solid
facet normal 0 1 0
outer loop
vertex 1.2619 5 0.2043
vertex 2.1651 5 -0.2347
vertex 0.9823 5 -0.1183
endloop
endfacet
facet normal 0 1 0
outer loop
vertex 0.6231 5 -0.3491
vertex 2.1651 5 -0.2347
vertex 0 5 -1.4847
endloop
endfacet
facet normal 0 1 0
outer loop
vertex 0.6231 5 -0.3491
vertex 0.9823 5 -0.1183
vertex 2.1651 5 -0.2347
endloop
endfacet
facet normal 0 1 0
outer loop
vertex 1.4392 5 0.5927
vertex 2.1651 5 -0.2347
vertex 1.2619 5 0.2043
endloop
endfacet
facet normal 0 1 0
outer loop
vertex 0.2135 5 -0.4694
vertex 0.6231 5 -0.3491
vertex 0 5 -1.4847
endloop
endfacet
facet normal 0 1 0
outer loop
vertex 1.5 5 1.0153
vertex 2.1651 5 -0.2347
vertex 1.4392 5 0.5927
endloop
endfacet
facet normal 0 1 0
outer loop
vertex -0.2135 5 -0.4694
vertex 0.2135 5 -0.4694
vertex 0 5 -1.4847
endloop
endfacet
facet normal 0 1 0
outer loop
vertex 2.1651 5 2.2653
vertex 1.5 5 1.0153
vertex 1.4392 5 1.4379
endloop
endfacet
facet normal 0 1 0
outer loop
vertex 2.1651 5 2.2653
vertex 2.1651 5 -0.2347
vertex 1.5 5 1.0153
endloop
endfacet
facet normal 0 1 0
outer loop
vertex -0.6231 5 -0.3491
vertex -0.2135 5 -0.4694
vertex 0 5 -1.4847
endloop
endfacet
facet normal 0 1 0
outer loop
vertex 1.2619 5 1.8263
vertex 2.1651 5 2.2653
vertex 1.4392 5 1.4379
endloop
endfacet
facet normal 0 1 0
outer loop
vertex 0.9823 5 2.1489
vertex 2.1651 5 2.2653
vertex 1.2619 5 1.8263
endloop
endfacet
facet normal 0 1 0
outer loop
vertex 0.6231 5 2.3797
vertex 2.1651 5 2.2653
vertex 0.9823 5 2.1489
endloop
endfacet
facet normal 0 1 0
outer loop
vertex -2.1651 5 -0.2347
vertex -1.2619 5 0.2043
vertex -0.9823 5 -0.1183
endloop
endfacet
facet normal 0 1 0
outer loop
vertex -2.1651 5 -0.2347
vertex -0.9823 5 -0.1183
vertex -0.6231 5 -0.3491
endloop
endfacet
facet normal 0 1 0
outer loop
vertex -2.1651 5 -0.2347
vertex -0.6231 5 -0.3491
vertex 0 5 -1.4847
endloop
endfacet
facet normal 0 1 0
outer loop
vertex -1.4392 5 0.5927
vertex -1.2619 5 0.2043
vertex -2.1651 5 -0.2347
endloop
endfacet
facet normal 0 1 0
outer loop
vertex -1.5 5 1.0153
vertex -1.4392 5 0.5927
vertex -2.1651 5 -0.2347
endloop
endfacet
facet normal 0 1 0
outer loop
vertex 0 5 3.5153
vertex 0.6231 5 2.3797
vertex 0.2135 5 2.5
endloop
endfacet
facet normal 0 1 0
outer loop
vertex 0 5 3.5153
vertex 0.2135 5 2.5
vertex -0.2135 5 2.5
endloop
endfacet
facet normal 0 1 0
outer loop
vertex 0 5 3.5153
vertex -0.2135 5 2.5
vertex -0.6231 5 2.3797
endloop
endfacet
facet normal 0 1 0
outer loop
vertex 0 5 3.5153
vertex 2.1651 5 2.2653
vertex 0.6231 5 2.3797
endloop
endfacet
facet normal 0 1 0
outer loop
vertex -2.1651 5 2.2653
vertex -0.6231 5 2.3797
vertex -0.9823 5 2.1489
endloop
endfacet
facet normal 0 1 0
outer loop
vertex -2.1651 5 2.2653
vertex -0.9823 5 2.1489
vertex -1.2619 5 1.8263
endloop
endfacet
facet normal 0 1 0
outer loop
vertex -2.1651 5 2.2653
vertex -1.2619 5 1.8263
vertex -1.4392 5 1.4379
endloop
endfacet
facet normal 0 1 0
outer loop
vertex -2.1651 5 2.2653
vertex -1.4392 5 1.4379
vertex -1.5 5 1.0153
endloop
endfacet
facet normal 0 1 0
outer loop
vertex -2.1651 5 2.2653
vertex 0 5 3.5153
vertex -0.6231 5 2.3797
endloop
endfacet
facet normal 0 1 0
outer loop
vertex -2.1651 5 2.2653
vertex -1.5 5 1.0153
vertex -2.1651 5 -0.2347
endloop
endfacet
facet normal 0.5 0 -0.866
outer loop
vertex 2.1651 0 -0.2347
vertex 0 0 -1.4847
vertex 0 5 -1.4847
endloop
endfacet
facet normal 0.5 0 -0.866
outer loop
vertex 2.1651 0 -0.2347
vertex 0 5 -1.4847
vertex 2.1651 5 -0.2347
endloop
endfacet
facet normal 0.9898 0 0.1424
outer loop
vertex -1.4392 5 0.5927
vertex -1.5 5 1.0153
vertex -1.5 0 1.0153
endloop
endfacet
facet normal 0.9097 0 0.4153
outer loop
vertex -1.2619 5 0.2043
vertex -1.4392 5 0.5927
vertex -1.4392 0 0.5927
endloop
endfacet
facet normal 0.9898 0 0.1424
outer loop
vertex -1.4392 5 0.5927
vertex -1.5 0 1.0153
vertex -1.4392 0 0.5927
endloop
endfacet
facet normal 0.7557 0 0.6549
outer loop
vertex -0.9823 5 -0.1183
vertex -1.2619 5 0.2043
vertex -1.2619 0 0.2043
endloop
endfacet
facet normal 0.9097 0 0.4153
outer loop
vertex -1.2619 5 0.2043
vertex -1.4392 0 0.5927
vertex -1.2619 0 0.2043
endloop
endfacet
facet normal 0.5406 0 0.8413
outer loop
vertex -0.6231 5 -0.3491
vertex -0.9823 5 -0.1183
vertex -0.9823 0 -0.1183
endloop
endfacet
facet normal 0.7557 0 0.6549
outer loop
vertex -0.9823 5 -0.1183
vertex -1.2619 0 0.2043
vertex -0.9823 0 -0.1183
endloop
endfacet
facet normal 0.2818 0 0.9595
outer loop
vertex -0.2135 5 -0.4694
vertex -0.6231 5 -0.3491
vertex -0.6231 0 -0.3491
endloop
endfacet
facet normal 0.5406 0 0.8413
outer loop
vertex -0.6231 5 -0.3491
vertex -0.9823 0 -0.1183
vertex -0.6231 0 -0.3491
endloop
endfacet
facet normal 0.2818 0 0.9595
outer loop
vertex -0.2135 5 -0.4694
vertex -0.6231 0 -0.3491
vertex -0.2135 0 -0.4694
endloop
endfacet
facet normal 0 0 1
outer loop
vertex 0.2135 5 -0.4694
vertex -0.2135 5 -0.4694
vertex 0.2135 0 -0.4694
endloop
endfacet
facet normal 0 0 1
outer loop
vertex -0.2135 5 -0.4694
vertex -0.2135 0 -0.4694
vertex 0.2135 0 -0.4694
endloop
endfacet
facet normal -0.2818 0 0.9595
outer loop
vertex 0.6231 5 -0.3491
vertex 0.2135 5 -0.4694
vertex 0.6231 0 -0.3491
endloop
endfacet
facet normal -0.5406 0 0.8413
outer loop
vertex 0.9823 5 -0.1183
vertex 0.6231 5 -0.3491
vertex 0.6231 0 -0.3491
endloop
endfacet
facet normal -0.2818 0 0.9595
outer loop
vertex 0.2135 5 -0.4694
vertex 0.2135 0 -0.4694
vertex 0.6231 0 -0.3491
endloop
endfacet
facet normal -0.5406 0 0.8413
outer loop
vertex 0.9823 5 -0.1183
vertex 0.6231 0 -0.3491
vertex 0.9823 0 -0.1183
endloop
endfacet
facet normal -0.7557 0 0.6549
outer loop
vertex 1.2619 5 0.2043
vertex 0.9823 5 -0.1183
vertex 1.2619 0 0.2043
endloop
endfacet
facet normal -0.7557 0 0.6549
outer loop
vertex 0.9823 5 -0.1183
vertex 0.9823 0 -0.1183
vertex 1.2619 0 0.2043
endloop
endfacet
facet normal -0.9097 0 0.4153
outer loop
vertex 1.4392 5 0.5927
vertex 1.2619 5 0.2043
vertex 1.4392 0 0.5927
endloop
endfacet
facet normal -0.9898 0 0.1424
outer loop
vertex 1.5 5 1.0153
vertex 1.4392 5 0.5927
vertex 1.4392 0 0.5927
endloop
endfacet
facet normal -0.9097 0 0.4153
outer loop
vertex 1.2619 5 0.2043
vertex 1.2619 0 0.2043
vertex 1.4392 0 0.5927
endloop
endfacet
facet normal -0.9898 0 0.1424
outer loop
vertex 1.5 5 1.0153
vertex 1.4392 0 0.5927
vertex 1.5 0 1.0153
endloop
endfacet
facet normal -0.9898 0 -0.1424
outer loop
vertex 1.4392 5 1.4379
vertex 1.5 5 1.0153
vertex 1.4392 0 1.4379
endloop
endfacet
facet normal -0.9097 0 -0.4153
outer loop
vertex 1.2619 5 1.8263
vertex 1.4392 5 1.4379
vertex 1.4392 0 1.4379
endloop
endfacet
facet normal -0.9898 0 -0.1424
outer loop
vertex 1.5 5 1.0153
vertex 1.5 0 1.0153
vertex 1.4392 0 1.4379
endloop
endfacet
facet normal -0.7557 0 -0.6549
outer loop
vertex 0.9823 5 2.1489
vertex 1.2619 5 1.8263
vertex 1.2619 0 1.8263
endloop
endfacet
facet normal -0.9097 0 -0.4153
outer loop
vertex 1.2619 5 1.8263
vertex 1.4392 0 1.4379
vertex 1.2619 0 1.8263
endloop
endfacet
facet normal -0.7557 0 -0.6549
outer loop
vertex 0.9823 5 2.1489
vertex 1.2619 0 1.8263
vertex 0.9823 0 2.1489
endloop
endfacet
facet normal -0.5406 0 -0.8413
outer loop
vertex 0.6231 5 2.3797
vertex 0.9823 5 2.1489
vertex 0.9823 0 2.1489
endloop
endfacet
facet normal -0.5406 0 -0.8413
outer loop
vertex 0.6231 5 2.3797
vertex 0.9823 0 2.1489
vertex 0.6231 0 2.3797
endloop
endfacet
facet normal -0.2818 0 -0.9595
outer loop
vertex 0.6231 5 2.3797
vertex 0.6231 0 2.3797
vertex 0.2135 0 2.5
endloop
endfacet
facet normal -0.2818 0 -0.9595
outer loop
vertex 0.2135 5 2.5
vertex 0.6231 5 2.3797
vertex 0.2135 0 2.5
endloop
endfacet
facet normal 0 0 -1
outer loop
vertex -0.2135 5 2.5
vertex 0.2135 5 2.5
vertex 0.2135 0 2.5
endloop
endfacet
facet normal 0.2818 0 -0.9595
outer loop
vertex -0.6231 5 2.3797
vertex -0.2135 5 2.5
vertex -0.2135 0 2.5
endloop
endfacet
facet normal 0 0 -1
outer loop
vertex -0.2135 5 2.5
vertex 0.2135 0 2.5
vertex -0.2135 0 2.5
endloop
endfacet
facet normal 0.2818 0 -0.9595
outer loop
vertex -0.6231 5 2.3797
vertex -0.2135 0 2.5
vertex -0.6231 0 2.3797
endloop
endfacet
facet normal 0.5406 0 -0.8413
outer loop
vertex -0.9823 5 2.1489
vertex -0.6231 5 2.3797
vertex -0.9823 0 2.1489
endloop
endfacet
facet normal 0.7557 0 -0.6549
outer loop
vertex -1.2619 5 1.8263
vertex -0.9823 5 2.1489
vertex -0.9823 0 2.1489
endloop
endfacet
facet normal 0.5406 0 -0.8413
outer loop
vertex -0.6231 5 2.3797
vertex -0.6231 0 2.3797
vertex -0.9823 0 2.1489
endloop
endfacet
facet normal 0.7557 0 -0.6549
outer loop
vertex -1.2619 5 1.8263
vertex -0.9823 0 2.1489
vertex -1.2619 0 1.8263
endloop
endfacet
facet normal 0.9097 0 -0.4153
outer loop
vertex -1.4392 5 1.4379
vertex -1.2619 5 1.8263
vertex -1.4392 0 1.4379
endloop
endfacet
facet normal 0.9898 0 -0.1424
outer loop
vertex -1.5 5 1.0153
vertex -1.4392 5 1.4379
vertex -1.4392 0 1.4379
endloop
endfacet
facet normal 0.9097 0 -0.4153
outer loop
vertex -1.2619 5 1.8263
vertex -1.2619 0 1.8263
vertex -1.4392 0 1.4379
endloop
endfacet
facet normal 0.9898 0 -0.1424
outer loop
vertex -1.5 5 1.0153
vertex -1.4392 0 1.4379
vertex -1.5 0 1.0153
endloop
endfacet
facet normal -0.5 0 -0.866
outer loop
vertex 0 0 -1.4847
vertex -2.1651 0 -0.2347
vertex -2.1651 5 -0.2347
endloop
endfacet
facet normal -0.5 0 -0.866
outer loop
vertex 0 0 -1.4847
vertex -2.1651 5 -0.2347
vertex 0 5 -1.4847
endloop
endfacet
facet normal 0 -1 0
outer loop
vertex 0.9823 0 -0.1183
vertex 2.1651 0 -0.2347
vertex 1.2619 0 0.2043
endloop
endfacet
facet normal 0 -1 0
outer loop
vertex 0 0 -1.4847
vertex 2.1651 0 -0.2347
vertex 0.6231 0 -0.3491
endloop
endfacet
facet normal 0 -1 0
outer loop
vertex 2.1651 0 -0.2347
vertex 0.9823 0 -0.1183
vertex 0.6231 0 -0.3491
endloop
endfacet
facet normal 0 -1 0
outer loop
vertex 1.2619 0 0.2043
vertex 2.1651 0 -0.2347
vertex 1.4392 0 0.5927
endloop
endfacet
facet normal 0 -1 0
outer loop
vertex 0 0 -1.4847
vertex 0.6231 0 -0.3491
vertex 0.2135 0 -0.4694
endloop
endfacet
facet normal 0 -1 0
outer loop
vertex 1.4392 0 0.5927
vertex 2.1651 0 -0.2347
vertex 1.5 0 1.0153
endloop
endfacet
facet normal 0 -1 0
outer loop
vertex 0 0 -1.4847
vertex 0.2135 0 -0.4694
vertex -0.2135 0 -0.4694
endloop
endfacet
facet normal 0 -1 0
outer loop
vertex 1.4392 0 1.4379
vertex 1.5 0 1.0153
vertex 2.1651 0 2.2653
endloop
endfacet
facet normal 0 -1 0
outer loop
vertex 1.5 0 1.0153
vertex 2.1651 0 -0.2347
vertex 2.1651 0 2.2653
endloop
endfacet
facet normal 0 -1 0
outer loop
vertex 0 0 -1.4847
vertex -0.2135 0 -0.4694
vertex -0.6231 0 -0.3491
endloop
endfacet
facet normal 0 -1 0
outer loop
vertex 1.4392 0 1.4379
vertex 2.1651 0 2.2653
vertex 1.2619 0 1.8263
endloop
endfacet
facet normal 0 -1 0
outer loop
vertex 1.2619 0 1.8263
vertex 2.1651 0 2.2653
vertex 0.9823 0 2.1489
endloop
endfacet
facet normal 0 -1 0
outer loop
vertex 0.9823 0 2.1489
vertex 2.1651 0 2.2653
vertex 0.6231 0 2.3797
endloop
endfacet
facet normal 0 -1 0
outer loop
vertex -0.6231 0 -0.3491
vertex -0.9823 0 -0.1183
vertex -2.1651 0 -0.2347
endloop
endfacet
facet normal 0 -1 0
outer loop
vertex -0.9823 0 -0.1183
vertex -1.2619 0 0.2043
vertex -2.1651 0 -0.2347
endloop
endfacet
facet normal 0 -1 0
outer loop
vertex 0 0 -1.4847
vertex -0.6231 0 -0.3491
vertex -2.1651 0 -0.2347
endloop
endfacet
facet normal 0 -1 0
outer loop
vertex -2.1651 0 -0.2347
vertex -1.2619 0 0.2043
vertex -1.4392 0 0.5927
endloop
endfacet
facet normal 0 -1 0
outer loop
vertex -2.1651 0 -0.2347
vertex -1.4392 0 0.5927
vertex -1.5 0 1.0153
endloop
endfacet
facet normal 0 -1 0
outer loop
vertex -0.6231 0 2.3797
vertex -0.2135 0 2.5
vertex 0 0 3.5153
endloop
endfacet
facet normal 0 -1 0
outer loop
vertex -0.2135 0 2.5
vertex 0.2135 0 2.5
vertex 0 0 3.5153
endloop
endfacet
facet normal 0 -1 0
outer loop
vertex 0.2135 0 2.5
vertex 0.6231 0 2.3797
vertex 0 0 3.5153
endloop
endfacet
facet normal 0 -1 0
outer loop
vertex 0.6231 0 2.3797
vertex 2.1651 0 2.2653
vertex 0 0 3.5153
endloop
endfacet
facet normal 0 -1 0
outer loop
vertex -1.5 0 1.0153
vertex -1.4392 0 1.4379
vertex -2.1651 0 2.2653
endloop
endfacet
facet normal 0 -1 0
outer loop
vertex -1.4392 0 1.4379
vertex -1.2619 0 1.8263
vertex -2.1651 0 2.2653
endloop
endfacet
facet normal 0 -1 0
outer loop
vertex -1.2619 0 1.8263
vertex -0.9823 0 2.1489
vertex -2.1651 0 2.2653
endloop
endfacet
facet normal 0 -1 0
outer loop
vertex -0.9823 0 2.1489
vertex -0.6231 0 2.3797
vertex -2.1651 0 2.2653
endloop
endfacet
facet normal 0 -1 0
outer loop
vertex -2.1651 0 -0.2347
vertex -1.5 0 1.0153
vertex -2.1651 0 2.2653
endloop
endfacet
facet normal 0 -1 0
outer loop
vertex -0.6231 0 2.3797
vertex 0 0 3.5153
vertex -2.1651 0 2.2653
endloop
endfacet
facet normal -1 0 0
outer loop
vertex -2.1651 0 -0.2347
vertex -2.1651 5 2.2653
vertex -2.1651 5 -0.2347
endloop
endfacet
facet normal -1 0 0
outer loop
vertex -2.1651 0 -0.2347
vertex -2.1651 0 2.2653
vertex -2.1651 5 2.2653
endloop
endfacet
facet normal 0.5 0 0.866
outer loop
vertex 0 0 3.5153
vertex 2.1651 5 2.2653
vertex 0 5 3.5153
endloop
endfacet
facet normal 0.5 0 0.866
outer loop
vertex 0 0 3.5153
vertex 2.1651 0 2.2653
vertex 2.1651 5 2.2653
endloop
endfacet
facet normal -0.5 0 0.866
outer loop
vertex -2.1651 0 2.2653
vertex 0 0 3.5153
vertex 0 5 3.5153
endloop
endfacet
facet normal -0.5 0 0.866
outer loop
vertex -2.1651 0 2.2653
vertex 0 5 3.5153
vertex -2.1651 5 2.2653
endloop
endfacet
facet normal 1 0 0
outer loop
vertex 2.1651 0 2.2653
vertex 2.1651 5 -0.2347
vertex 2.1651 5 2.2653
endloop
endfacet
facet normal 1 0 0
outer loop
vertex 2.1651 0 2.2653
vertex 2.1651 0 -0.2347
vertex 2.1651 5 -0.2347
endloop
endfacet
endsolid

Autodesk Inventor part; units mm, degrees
ref_plane "YZ Plane" through (0, 0, 0) normal (1, 0, 0) x (0, 1, 0)
ref_plane "XZ Plane" through (0, 0, 0) normal (0, 1, 0) x (-1, 0, 0)
ref_plane "XY Plane" through (0, 0, 0) normal (0, 0, 1) x (1, 0, 0)
sketch "Эскиз1" plane through (0, 0, 0) normal (0, 1, 0) x (-1, 0, 0)
  line L0 (0, 3.5153) -> (0, -1.4847)
  line L1 (0, -1.4847) -> (-2.1651, -0.2347)
  line L2 (-2.1651, -0.2347) -> (-2.1651, 2.2653)
  line L3 (-2.1651, 2.2653) -> (0, 3.5153)
  line L4 (0, 3.5153) -> (2.1651, 2.2653)
  line L5 (2.1651, 2.2653) -> (2.1651, -0.2347)
  line L6 (2.1651, -0.2347) -> (0, -1.4847)
  circle A0 centre (0, 1.0153) radius 1.5
  point P0 (0, 0)
  dimension "d0" = 5
  dimension "d1" = 3
extrude "Выдавливание1" add sketch "Эскиз1" along normal blind 5 contours L4 L5 L6 L0 A0 | L0 A0 L1 L2 L3
thread "Резьба1" size "M3x0.5" class "6H" standard "ANSI Metric M Profile" full length
properties part number "rack_05"
